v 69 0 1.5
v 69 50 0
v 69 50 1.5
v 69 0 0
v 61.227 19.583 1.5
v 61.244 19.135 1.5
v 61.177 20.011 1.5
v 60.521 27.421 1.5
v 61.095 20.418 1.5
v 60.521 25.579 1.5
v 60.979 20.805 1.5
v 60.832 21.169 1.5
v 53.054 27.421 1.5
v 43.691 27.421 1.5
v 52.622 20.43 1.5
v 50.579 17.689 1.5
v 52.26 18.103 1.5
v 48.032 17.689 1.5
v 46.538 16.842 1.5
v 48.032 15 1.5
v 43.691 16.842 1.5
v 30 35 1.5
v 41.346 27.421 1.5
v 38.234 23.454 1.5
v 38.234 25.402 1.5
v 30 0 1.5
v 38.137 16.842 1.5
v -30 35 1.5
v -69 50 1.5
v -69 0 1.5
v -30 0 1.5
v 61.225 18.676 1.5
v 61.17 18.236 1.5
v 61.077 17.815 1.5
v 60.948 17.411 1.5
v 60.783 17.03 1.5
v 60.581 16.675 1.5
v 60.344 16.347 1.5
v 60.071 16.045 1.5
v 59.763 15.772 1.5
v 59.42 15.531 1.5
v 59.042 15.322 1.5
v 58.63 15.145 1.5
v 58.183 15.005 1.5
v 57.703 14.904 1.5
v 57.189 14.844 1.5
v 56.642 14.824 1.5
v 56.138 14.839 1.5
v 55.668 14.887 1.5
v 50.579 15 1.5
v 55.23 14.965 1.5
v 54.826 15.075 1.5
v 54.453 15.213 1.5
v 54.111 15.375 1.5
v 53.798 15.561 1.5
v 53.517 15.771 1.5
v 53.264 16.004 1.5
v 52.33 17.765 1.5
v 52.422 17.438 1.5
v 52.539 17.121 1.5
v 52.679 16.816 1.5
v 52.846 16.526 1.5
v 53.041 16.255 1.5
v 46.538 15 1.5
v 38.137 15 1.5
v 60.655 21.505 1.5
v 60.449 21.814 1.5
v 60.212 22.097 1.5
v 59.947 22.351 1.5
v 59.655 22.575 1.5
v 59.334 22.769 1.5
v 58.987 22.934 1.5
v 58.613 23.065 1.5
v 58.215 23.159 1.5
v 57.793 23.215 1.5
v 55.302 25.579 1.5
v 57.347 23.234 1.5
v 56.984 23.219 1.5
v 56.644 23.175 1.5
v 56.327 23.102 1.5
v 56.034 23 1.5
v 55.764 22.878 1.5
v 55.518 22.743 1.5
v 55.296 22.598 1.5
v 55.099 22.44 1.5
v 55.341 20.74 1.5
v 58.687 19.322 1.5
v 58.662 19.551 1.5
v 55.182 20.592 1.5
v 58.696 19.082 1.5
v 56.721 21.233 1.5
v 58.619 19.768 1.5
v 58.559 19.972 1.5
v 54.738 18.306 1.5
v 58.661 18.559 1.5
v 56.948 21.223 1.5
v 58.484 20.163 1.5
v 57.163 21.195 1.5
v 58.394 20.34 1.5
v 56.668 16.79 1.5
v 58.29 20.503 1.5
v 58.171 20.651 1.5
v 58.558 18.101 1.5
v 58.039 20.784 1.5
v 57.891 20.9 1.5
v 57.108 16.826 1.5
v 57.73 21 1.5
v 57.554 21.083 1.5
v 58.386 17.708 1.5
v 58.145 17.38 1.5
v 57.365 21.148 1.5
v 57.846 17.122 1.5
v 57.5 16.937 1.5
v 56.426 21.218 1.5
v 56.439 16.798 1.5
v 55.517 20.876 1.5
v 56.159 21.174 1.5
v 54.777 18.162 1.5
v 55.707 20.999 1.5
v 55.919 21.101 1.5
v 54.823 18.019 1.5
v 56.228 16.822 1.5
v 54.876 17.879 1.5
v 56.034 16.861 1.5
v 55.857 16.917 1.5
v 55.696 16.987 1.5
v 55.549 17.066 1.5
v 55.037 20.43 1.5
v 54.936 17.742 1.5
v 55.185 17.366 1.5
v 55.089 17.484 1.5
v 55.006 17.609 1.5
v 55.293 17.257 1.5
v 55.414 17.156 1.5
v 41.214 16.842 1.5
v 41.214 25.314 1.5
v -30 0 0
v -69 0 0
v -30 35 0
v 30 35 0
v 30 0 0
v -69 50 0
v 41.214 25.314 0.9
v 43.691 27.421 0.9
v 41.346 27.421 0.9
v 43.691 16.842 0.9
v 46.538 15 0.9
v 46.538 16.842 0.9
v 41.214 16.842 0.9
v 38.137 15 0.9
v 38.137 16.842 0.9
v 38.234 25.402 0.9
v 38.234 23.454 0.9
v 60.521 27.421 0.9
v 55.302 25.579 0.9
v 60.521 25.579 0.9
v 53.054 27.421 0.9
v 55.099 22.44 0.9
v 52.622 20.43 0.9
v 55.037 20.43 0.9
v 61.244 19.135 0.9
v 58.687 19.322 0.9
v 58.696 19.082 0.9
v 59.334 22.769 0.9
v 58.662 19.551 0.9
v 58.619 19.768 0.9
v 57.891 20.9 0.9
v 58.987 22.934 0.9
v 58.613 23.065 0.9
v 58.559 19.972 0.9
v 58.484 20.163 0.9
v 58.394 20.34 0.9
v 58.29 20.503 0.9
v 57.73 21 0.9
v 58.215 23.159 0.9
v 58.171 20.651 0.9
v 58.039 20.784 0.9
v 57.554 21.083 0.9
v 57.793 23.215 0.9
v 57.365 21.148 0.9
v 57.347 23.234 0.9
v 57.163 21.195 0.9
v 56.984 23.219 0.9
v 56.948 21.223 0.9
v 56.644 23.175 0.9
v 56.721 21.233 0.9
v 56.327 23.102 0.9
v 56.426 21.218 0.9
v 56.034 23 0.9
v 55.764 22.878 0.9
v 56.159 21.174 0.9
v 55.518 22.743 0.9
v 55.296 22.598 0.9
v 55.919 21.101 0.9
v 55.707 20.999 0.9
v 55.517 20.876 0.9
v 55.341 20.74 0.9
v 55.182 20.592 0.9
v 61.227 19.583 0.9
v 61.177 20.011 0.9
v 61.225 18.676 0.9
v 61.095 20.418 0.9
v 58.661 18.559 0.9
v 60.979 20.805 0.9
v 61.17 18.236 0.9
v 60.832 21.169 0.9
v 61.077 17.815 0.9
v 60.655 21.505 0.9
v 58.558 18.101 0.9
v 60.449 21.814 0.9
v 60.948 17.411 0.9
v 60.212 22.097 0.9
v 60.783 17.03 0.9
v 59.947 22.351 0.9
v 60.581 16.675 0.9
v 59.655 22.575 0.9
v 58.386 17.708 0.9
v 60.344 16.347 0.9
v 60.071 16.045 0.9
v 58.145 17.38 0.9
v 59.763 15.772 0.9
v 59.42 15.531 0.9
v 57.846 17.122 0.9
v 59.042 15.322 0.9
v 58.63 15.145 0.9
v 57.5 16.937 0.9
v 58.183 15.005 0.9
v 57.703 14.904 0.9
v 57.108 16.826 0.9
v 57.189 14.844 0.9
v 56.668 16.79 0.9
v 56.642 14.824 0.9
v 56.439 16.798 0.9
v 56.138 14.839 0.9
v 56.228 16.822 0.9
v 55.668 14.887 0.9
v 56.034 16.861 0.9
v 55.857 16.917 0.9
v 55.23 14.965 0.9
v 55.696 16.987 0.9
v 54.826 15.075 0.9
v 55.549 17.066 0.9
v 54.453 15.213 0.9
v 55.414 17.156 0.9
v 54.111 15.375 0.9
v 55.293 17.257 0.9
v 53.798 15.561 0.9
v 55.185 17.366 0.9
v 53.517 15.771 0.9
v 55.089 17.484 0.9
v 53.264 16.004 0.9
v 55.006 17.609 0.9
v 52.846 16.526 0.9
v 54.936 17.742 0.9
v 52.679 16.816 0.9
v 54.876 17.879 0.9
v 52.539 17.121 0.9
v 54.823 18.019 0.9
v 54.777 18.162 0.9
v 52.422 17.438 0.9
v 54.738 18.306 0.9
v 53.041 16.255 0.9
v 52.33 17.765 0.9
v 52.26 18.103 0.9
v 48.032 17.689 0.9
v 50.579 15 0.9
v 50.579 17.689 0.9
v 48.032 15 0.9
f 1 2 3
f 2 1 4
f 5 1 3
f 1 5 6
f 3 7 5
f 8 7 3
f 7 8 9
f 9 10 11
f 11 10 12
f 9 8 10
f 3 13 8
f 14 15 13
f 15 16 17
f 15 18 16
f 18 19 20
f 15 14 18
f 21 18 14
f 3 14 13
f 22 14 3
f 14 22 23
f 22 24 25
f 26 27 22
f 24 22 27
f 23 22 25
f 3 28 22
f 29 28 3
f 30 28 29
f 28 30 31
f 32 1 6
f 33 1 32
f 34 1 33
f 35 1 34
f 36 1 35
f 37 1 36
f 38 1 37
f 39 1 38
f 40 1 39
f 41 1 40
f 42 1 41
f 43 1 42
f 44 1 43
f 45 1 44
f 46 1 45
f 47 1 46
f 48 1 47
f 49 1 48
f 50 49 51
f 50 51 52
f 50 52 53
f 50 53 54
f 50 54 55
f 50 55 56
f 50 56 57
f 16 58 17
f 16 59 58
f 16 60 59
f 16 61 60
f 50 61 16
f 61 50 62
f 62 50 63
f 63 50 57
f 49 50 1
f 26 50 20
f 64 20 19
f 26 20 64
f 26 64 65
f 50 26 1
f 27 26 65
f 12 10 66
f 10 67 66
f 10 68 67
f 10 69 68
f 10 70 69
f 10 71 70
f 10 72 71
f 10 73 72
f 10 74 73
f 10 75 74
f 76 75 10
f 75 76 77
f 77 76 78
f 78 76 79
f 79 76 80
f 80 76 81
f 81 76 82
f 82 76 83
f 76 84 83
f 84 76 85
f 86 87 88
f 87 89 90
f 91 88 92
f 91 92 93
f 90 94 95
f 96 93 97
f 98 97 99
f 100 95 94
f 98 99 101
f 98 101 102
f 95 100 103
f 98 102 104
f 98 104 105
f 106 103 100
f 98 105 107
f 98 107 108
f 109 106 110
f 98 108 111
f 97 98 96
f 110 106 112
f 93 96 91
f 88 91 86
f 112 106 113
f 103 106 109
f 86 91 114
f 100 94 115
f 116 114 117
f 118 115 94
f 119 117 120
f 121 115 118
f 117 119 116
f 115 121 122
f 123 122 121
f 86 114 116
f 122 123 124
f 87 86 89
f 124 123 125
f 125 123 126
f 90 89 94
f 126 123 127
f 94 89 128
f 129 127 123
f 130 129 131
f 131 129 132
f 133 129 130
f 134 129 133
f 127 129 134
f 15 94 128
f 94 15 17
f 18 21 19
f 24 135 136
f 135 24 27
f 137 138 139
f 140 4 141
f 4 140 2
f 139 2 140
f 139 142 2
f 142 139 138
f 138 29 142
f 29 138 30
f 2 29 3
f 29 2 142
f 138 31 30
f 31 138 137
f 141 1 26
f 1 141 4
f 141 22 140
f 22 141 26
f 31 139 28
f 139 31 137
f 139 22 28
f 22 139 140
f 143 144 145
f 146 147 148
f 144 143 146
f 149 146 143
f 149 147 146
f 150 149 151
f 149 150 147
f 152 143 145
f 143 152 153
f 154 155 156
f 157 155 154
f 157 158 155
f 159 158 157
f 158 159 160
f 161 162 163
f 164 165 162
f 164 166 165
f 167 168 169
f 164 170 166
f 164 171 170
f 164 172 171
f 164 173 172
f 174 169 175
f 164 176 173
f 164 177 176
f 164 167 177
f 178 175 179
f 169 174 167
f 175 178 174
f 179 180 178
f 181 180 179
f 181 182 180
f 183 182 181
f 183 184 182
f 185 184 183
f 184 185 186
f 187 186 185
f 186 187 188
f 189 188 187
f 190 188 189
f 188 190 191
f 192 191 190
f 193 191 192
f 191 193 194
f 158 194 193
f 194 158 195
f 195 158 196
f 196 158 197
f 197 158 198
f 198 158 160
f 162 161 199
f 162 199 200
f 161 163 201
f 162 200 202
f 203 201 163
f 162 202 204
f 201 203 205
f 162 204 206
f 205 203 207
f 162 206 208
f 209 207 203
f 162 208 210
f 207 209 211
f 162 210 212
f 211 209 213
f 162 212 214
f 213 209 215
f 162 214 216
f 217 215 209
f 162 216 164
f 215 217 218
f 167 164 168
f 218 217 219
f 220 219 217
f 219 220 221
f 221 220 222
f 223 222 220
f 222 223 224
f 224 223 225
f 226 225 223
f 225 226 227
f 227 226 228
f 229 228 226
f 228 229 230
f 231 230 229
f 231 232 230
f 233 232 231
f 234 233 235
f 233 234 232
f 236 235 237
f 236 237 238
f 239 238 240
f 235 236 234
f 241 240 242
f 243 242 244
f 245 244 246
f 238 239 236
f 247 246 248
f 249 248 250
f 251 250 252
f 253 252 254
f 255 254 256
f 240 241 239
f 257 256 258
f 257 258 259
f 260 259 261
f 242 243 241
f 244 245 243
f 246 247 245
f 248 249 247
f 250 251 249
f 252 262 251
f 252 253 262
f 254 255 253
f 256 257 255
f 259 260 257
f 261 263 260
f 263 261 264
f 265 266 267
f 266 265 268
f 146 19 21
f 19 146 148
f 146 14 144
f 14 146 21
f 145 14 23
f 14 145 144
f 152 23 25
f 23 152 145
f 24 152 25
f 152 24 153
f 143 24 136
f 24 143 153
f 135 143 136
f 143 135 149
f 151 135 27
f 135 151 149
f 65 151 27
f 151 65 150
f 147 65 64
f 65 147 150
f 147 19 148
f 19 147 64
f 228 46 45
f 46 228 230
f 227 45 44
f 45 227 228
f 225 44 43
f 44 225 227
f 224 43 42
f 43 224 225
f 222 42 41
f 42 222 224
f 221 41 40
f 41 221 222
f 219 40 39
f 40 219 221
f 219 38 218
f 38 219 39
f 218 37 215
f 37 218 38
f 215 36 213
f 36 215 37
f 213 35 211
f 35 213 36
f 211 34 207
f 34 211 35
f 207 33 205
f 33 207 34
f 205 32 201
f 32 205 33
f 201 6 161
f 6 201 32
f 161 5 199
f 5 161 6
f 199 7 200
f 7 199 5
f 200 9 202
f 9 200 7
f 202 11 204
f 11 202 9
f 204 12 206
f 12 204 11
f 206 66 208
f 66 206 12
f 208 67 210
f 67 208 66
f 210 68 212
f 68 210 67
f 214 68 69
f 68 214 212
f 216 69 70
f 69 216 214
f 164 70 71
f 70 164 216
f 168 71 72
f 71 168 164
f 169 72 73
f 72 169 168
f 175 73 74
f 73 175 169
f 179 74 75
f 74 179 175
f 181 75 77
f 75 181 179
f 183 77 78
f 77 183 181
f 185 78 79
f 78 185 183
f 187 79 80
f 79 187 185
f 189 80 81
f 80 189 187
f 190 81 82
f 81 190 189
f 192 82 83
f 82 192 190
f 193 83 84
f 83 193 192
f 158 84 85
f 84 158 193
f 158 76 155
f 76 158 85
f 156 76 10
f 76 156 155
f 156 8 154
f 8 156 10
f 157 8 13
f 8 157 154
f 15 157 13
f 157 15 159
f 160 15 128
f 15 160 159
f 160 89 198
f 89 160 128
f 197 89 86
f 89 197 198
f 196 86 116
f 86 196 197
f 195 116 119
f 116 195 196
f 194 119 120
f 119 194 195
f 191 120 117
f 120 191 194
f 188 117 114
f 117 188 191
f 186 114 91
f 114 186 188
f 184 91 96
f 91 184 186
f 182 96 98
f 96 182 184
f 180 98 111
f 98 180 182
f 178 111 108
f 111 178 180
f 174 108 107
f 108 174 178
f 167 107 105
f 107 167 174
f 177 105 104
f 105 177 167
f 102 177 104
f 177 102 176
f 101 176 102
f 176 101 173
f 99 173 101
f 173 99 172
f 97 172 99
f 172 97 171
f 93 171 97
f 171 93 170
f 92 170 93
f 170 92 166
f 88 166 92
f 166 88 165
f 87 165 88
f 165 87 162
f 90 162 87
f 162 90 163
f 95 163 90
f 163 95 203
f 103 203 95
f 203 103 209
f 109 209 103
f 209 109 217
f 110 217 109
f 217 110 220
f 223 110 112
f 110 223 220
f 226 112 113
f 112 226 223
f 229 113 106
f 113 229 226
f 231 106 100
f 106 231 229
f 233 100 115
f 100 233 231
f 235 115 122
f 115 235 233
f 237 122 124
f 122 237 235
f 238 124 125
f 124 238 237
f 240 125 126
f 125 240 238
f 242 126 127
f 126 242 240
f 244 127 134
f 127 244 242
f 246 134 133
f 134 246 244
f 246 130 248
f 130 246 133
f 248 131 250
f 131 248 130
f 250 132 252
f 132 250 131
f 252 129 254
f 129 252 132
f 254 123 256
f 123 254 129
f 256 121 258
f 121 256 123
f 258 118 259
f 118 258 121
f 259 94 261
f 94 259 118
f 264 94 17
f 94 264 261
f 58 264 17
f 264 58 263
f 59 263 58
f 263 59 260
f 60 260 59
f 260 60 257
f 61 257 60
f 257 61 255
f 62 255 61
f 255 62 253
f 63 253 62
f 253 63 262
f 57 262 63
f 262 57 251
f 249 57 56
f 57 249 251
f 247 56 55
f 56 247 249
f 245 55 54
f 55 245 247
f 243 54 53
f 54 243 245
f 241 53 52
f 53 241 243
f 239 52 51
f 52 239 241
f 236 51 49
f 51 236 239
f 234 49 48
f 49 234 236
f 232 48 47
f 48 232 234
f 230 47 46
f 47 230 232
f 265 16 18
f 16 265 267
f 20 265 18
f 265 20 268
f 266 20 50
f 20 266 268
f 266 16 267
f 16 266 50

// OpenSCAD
router_edge_jig_sheet(max_cutter_len=40);


function num2str(number) = round(number) == number ? str(number, ".0") : str(number);

/* Dimensions according to first (not rounded) router edge jig */
module router_edge_jig_sheet(
  inner_len = 60,       // see inner_x
  outer_len = 138,      // see outer_x
  max_cutter_len = 40,  // maximum cutter length sticking out of router chuck
  sheet_th = 1.5        // sheet thickness 
) {
    // internal constants based on experience
    guide_h = 50;  // height of the jig's guides
    text_h = 0.6;  // amount of lowering the text from surface
    difference() {
        translate ([0, guide_h/2, sheet_th/2]) cube([outer_len, guide_h, sheet_th], center=true);
        translate([0, (max_cutter_len-5)/2, sheet_th/2]) cube([inner_len, max_cutter_len-5, sheet_th*2], center=true);
        
        translate([37, 15, sheet_th-text_h]) linear_extrude(height = sheet_th*2) text(num2str(sheet_th), font="Liberation Sans:style=Bold", size=13);
   }
}
